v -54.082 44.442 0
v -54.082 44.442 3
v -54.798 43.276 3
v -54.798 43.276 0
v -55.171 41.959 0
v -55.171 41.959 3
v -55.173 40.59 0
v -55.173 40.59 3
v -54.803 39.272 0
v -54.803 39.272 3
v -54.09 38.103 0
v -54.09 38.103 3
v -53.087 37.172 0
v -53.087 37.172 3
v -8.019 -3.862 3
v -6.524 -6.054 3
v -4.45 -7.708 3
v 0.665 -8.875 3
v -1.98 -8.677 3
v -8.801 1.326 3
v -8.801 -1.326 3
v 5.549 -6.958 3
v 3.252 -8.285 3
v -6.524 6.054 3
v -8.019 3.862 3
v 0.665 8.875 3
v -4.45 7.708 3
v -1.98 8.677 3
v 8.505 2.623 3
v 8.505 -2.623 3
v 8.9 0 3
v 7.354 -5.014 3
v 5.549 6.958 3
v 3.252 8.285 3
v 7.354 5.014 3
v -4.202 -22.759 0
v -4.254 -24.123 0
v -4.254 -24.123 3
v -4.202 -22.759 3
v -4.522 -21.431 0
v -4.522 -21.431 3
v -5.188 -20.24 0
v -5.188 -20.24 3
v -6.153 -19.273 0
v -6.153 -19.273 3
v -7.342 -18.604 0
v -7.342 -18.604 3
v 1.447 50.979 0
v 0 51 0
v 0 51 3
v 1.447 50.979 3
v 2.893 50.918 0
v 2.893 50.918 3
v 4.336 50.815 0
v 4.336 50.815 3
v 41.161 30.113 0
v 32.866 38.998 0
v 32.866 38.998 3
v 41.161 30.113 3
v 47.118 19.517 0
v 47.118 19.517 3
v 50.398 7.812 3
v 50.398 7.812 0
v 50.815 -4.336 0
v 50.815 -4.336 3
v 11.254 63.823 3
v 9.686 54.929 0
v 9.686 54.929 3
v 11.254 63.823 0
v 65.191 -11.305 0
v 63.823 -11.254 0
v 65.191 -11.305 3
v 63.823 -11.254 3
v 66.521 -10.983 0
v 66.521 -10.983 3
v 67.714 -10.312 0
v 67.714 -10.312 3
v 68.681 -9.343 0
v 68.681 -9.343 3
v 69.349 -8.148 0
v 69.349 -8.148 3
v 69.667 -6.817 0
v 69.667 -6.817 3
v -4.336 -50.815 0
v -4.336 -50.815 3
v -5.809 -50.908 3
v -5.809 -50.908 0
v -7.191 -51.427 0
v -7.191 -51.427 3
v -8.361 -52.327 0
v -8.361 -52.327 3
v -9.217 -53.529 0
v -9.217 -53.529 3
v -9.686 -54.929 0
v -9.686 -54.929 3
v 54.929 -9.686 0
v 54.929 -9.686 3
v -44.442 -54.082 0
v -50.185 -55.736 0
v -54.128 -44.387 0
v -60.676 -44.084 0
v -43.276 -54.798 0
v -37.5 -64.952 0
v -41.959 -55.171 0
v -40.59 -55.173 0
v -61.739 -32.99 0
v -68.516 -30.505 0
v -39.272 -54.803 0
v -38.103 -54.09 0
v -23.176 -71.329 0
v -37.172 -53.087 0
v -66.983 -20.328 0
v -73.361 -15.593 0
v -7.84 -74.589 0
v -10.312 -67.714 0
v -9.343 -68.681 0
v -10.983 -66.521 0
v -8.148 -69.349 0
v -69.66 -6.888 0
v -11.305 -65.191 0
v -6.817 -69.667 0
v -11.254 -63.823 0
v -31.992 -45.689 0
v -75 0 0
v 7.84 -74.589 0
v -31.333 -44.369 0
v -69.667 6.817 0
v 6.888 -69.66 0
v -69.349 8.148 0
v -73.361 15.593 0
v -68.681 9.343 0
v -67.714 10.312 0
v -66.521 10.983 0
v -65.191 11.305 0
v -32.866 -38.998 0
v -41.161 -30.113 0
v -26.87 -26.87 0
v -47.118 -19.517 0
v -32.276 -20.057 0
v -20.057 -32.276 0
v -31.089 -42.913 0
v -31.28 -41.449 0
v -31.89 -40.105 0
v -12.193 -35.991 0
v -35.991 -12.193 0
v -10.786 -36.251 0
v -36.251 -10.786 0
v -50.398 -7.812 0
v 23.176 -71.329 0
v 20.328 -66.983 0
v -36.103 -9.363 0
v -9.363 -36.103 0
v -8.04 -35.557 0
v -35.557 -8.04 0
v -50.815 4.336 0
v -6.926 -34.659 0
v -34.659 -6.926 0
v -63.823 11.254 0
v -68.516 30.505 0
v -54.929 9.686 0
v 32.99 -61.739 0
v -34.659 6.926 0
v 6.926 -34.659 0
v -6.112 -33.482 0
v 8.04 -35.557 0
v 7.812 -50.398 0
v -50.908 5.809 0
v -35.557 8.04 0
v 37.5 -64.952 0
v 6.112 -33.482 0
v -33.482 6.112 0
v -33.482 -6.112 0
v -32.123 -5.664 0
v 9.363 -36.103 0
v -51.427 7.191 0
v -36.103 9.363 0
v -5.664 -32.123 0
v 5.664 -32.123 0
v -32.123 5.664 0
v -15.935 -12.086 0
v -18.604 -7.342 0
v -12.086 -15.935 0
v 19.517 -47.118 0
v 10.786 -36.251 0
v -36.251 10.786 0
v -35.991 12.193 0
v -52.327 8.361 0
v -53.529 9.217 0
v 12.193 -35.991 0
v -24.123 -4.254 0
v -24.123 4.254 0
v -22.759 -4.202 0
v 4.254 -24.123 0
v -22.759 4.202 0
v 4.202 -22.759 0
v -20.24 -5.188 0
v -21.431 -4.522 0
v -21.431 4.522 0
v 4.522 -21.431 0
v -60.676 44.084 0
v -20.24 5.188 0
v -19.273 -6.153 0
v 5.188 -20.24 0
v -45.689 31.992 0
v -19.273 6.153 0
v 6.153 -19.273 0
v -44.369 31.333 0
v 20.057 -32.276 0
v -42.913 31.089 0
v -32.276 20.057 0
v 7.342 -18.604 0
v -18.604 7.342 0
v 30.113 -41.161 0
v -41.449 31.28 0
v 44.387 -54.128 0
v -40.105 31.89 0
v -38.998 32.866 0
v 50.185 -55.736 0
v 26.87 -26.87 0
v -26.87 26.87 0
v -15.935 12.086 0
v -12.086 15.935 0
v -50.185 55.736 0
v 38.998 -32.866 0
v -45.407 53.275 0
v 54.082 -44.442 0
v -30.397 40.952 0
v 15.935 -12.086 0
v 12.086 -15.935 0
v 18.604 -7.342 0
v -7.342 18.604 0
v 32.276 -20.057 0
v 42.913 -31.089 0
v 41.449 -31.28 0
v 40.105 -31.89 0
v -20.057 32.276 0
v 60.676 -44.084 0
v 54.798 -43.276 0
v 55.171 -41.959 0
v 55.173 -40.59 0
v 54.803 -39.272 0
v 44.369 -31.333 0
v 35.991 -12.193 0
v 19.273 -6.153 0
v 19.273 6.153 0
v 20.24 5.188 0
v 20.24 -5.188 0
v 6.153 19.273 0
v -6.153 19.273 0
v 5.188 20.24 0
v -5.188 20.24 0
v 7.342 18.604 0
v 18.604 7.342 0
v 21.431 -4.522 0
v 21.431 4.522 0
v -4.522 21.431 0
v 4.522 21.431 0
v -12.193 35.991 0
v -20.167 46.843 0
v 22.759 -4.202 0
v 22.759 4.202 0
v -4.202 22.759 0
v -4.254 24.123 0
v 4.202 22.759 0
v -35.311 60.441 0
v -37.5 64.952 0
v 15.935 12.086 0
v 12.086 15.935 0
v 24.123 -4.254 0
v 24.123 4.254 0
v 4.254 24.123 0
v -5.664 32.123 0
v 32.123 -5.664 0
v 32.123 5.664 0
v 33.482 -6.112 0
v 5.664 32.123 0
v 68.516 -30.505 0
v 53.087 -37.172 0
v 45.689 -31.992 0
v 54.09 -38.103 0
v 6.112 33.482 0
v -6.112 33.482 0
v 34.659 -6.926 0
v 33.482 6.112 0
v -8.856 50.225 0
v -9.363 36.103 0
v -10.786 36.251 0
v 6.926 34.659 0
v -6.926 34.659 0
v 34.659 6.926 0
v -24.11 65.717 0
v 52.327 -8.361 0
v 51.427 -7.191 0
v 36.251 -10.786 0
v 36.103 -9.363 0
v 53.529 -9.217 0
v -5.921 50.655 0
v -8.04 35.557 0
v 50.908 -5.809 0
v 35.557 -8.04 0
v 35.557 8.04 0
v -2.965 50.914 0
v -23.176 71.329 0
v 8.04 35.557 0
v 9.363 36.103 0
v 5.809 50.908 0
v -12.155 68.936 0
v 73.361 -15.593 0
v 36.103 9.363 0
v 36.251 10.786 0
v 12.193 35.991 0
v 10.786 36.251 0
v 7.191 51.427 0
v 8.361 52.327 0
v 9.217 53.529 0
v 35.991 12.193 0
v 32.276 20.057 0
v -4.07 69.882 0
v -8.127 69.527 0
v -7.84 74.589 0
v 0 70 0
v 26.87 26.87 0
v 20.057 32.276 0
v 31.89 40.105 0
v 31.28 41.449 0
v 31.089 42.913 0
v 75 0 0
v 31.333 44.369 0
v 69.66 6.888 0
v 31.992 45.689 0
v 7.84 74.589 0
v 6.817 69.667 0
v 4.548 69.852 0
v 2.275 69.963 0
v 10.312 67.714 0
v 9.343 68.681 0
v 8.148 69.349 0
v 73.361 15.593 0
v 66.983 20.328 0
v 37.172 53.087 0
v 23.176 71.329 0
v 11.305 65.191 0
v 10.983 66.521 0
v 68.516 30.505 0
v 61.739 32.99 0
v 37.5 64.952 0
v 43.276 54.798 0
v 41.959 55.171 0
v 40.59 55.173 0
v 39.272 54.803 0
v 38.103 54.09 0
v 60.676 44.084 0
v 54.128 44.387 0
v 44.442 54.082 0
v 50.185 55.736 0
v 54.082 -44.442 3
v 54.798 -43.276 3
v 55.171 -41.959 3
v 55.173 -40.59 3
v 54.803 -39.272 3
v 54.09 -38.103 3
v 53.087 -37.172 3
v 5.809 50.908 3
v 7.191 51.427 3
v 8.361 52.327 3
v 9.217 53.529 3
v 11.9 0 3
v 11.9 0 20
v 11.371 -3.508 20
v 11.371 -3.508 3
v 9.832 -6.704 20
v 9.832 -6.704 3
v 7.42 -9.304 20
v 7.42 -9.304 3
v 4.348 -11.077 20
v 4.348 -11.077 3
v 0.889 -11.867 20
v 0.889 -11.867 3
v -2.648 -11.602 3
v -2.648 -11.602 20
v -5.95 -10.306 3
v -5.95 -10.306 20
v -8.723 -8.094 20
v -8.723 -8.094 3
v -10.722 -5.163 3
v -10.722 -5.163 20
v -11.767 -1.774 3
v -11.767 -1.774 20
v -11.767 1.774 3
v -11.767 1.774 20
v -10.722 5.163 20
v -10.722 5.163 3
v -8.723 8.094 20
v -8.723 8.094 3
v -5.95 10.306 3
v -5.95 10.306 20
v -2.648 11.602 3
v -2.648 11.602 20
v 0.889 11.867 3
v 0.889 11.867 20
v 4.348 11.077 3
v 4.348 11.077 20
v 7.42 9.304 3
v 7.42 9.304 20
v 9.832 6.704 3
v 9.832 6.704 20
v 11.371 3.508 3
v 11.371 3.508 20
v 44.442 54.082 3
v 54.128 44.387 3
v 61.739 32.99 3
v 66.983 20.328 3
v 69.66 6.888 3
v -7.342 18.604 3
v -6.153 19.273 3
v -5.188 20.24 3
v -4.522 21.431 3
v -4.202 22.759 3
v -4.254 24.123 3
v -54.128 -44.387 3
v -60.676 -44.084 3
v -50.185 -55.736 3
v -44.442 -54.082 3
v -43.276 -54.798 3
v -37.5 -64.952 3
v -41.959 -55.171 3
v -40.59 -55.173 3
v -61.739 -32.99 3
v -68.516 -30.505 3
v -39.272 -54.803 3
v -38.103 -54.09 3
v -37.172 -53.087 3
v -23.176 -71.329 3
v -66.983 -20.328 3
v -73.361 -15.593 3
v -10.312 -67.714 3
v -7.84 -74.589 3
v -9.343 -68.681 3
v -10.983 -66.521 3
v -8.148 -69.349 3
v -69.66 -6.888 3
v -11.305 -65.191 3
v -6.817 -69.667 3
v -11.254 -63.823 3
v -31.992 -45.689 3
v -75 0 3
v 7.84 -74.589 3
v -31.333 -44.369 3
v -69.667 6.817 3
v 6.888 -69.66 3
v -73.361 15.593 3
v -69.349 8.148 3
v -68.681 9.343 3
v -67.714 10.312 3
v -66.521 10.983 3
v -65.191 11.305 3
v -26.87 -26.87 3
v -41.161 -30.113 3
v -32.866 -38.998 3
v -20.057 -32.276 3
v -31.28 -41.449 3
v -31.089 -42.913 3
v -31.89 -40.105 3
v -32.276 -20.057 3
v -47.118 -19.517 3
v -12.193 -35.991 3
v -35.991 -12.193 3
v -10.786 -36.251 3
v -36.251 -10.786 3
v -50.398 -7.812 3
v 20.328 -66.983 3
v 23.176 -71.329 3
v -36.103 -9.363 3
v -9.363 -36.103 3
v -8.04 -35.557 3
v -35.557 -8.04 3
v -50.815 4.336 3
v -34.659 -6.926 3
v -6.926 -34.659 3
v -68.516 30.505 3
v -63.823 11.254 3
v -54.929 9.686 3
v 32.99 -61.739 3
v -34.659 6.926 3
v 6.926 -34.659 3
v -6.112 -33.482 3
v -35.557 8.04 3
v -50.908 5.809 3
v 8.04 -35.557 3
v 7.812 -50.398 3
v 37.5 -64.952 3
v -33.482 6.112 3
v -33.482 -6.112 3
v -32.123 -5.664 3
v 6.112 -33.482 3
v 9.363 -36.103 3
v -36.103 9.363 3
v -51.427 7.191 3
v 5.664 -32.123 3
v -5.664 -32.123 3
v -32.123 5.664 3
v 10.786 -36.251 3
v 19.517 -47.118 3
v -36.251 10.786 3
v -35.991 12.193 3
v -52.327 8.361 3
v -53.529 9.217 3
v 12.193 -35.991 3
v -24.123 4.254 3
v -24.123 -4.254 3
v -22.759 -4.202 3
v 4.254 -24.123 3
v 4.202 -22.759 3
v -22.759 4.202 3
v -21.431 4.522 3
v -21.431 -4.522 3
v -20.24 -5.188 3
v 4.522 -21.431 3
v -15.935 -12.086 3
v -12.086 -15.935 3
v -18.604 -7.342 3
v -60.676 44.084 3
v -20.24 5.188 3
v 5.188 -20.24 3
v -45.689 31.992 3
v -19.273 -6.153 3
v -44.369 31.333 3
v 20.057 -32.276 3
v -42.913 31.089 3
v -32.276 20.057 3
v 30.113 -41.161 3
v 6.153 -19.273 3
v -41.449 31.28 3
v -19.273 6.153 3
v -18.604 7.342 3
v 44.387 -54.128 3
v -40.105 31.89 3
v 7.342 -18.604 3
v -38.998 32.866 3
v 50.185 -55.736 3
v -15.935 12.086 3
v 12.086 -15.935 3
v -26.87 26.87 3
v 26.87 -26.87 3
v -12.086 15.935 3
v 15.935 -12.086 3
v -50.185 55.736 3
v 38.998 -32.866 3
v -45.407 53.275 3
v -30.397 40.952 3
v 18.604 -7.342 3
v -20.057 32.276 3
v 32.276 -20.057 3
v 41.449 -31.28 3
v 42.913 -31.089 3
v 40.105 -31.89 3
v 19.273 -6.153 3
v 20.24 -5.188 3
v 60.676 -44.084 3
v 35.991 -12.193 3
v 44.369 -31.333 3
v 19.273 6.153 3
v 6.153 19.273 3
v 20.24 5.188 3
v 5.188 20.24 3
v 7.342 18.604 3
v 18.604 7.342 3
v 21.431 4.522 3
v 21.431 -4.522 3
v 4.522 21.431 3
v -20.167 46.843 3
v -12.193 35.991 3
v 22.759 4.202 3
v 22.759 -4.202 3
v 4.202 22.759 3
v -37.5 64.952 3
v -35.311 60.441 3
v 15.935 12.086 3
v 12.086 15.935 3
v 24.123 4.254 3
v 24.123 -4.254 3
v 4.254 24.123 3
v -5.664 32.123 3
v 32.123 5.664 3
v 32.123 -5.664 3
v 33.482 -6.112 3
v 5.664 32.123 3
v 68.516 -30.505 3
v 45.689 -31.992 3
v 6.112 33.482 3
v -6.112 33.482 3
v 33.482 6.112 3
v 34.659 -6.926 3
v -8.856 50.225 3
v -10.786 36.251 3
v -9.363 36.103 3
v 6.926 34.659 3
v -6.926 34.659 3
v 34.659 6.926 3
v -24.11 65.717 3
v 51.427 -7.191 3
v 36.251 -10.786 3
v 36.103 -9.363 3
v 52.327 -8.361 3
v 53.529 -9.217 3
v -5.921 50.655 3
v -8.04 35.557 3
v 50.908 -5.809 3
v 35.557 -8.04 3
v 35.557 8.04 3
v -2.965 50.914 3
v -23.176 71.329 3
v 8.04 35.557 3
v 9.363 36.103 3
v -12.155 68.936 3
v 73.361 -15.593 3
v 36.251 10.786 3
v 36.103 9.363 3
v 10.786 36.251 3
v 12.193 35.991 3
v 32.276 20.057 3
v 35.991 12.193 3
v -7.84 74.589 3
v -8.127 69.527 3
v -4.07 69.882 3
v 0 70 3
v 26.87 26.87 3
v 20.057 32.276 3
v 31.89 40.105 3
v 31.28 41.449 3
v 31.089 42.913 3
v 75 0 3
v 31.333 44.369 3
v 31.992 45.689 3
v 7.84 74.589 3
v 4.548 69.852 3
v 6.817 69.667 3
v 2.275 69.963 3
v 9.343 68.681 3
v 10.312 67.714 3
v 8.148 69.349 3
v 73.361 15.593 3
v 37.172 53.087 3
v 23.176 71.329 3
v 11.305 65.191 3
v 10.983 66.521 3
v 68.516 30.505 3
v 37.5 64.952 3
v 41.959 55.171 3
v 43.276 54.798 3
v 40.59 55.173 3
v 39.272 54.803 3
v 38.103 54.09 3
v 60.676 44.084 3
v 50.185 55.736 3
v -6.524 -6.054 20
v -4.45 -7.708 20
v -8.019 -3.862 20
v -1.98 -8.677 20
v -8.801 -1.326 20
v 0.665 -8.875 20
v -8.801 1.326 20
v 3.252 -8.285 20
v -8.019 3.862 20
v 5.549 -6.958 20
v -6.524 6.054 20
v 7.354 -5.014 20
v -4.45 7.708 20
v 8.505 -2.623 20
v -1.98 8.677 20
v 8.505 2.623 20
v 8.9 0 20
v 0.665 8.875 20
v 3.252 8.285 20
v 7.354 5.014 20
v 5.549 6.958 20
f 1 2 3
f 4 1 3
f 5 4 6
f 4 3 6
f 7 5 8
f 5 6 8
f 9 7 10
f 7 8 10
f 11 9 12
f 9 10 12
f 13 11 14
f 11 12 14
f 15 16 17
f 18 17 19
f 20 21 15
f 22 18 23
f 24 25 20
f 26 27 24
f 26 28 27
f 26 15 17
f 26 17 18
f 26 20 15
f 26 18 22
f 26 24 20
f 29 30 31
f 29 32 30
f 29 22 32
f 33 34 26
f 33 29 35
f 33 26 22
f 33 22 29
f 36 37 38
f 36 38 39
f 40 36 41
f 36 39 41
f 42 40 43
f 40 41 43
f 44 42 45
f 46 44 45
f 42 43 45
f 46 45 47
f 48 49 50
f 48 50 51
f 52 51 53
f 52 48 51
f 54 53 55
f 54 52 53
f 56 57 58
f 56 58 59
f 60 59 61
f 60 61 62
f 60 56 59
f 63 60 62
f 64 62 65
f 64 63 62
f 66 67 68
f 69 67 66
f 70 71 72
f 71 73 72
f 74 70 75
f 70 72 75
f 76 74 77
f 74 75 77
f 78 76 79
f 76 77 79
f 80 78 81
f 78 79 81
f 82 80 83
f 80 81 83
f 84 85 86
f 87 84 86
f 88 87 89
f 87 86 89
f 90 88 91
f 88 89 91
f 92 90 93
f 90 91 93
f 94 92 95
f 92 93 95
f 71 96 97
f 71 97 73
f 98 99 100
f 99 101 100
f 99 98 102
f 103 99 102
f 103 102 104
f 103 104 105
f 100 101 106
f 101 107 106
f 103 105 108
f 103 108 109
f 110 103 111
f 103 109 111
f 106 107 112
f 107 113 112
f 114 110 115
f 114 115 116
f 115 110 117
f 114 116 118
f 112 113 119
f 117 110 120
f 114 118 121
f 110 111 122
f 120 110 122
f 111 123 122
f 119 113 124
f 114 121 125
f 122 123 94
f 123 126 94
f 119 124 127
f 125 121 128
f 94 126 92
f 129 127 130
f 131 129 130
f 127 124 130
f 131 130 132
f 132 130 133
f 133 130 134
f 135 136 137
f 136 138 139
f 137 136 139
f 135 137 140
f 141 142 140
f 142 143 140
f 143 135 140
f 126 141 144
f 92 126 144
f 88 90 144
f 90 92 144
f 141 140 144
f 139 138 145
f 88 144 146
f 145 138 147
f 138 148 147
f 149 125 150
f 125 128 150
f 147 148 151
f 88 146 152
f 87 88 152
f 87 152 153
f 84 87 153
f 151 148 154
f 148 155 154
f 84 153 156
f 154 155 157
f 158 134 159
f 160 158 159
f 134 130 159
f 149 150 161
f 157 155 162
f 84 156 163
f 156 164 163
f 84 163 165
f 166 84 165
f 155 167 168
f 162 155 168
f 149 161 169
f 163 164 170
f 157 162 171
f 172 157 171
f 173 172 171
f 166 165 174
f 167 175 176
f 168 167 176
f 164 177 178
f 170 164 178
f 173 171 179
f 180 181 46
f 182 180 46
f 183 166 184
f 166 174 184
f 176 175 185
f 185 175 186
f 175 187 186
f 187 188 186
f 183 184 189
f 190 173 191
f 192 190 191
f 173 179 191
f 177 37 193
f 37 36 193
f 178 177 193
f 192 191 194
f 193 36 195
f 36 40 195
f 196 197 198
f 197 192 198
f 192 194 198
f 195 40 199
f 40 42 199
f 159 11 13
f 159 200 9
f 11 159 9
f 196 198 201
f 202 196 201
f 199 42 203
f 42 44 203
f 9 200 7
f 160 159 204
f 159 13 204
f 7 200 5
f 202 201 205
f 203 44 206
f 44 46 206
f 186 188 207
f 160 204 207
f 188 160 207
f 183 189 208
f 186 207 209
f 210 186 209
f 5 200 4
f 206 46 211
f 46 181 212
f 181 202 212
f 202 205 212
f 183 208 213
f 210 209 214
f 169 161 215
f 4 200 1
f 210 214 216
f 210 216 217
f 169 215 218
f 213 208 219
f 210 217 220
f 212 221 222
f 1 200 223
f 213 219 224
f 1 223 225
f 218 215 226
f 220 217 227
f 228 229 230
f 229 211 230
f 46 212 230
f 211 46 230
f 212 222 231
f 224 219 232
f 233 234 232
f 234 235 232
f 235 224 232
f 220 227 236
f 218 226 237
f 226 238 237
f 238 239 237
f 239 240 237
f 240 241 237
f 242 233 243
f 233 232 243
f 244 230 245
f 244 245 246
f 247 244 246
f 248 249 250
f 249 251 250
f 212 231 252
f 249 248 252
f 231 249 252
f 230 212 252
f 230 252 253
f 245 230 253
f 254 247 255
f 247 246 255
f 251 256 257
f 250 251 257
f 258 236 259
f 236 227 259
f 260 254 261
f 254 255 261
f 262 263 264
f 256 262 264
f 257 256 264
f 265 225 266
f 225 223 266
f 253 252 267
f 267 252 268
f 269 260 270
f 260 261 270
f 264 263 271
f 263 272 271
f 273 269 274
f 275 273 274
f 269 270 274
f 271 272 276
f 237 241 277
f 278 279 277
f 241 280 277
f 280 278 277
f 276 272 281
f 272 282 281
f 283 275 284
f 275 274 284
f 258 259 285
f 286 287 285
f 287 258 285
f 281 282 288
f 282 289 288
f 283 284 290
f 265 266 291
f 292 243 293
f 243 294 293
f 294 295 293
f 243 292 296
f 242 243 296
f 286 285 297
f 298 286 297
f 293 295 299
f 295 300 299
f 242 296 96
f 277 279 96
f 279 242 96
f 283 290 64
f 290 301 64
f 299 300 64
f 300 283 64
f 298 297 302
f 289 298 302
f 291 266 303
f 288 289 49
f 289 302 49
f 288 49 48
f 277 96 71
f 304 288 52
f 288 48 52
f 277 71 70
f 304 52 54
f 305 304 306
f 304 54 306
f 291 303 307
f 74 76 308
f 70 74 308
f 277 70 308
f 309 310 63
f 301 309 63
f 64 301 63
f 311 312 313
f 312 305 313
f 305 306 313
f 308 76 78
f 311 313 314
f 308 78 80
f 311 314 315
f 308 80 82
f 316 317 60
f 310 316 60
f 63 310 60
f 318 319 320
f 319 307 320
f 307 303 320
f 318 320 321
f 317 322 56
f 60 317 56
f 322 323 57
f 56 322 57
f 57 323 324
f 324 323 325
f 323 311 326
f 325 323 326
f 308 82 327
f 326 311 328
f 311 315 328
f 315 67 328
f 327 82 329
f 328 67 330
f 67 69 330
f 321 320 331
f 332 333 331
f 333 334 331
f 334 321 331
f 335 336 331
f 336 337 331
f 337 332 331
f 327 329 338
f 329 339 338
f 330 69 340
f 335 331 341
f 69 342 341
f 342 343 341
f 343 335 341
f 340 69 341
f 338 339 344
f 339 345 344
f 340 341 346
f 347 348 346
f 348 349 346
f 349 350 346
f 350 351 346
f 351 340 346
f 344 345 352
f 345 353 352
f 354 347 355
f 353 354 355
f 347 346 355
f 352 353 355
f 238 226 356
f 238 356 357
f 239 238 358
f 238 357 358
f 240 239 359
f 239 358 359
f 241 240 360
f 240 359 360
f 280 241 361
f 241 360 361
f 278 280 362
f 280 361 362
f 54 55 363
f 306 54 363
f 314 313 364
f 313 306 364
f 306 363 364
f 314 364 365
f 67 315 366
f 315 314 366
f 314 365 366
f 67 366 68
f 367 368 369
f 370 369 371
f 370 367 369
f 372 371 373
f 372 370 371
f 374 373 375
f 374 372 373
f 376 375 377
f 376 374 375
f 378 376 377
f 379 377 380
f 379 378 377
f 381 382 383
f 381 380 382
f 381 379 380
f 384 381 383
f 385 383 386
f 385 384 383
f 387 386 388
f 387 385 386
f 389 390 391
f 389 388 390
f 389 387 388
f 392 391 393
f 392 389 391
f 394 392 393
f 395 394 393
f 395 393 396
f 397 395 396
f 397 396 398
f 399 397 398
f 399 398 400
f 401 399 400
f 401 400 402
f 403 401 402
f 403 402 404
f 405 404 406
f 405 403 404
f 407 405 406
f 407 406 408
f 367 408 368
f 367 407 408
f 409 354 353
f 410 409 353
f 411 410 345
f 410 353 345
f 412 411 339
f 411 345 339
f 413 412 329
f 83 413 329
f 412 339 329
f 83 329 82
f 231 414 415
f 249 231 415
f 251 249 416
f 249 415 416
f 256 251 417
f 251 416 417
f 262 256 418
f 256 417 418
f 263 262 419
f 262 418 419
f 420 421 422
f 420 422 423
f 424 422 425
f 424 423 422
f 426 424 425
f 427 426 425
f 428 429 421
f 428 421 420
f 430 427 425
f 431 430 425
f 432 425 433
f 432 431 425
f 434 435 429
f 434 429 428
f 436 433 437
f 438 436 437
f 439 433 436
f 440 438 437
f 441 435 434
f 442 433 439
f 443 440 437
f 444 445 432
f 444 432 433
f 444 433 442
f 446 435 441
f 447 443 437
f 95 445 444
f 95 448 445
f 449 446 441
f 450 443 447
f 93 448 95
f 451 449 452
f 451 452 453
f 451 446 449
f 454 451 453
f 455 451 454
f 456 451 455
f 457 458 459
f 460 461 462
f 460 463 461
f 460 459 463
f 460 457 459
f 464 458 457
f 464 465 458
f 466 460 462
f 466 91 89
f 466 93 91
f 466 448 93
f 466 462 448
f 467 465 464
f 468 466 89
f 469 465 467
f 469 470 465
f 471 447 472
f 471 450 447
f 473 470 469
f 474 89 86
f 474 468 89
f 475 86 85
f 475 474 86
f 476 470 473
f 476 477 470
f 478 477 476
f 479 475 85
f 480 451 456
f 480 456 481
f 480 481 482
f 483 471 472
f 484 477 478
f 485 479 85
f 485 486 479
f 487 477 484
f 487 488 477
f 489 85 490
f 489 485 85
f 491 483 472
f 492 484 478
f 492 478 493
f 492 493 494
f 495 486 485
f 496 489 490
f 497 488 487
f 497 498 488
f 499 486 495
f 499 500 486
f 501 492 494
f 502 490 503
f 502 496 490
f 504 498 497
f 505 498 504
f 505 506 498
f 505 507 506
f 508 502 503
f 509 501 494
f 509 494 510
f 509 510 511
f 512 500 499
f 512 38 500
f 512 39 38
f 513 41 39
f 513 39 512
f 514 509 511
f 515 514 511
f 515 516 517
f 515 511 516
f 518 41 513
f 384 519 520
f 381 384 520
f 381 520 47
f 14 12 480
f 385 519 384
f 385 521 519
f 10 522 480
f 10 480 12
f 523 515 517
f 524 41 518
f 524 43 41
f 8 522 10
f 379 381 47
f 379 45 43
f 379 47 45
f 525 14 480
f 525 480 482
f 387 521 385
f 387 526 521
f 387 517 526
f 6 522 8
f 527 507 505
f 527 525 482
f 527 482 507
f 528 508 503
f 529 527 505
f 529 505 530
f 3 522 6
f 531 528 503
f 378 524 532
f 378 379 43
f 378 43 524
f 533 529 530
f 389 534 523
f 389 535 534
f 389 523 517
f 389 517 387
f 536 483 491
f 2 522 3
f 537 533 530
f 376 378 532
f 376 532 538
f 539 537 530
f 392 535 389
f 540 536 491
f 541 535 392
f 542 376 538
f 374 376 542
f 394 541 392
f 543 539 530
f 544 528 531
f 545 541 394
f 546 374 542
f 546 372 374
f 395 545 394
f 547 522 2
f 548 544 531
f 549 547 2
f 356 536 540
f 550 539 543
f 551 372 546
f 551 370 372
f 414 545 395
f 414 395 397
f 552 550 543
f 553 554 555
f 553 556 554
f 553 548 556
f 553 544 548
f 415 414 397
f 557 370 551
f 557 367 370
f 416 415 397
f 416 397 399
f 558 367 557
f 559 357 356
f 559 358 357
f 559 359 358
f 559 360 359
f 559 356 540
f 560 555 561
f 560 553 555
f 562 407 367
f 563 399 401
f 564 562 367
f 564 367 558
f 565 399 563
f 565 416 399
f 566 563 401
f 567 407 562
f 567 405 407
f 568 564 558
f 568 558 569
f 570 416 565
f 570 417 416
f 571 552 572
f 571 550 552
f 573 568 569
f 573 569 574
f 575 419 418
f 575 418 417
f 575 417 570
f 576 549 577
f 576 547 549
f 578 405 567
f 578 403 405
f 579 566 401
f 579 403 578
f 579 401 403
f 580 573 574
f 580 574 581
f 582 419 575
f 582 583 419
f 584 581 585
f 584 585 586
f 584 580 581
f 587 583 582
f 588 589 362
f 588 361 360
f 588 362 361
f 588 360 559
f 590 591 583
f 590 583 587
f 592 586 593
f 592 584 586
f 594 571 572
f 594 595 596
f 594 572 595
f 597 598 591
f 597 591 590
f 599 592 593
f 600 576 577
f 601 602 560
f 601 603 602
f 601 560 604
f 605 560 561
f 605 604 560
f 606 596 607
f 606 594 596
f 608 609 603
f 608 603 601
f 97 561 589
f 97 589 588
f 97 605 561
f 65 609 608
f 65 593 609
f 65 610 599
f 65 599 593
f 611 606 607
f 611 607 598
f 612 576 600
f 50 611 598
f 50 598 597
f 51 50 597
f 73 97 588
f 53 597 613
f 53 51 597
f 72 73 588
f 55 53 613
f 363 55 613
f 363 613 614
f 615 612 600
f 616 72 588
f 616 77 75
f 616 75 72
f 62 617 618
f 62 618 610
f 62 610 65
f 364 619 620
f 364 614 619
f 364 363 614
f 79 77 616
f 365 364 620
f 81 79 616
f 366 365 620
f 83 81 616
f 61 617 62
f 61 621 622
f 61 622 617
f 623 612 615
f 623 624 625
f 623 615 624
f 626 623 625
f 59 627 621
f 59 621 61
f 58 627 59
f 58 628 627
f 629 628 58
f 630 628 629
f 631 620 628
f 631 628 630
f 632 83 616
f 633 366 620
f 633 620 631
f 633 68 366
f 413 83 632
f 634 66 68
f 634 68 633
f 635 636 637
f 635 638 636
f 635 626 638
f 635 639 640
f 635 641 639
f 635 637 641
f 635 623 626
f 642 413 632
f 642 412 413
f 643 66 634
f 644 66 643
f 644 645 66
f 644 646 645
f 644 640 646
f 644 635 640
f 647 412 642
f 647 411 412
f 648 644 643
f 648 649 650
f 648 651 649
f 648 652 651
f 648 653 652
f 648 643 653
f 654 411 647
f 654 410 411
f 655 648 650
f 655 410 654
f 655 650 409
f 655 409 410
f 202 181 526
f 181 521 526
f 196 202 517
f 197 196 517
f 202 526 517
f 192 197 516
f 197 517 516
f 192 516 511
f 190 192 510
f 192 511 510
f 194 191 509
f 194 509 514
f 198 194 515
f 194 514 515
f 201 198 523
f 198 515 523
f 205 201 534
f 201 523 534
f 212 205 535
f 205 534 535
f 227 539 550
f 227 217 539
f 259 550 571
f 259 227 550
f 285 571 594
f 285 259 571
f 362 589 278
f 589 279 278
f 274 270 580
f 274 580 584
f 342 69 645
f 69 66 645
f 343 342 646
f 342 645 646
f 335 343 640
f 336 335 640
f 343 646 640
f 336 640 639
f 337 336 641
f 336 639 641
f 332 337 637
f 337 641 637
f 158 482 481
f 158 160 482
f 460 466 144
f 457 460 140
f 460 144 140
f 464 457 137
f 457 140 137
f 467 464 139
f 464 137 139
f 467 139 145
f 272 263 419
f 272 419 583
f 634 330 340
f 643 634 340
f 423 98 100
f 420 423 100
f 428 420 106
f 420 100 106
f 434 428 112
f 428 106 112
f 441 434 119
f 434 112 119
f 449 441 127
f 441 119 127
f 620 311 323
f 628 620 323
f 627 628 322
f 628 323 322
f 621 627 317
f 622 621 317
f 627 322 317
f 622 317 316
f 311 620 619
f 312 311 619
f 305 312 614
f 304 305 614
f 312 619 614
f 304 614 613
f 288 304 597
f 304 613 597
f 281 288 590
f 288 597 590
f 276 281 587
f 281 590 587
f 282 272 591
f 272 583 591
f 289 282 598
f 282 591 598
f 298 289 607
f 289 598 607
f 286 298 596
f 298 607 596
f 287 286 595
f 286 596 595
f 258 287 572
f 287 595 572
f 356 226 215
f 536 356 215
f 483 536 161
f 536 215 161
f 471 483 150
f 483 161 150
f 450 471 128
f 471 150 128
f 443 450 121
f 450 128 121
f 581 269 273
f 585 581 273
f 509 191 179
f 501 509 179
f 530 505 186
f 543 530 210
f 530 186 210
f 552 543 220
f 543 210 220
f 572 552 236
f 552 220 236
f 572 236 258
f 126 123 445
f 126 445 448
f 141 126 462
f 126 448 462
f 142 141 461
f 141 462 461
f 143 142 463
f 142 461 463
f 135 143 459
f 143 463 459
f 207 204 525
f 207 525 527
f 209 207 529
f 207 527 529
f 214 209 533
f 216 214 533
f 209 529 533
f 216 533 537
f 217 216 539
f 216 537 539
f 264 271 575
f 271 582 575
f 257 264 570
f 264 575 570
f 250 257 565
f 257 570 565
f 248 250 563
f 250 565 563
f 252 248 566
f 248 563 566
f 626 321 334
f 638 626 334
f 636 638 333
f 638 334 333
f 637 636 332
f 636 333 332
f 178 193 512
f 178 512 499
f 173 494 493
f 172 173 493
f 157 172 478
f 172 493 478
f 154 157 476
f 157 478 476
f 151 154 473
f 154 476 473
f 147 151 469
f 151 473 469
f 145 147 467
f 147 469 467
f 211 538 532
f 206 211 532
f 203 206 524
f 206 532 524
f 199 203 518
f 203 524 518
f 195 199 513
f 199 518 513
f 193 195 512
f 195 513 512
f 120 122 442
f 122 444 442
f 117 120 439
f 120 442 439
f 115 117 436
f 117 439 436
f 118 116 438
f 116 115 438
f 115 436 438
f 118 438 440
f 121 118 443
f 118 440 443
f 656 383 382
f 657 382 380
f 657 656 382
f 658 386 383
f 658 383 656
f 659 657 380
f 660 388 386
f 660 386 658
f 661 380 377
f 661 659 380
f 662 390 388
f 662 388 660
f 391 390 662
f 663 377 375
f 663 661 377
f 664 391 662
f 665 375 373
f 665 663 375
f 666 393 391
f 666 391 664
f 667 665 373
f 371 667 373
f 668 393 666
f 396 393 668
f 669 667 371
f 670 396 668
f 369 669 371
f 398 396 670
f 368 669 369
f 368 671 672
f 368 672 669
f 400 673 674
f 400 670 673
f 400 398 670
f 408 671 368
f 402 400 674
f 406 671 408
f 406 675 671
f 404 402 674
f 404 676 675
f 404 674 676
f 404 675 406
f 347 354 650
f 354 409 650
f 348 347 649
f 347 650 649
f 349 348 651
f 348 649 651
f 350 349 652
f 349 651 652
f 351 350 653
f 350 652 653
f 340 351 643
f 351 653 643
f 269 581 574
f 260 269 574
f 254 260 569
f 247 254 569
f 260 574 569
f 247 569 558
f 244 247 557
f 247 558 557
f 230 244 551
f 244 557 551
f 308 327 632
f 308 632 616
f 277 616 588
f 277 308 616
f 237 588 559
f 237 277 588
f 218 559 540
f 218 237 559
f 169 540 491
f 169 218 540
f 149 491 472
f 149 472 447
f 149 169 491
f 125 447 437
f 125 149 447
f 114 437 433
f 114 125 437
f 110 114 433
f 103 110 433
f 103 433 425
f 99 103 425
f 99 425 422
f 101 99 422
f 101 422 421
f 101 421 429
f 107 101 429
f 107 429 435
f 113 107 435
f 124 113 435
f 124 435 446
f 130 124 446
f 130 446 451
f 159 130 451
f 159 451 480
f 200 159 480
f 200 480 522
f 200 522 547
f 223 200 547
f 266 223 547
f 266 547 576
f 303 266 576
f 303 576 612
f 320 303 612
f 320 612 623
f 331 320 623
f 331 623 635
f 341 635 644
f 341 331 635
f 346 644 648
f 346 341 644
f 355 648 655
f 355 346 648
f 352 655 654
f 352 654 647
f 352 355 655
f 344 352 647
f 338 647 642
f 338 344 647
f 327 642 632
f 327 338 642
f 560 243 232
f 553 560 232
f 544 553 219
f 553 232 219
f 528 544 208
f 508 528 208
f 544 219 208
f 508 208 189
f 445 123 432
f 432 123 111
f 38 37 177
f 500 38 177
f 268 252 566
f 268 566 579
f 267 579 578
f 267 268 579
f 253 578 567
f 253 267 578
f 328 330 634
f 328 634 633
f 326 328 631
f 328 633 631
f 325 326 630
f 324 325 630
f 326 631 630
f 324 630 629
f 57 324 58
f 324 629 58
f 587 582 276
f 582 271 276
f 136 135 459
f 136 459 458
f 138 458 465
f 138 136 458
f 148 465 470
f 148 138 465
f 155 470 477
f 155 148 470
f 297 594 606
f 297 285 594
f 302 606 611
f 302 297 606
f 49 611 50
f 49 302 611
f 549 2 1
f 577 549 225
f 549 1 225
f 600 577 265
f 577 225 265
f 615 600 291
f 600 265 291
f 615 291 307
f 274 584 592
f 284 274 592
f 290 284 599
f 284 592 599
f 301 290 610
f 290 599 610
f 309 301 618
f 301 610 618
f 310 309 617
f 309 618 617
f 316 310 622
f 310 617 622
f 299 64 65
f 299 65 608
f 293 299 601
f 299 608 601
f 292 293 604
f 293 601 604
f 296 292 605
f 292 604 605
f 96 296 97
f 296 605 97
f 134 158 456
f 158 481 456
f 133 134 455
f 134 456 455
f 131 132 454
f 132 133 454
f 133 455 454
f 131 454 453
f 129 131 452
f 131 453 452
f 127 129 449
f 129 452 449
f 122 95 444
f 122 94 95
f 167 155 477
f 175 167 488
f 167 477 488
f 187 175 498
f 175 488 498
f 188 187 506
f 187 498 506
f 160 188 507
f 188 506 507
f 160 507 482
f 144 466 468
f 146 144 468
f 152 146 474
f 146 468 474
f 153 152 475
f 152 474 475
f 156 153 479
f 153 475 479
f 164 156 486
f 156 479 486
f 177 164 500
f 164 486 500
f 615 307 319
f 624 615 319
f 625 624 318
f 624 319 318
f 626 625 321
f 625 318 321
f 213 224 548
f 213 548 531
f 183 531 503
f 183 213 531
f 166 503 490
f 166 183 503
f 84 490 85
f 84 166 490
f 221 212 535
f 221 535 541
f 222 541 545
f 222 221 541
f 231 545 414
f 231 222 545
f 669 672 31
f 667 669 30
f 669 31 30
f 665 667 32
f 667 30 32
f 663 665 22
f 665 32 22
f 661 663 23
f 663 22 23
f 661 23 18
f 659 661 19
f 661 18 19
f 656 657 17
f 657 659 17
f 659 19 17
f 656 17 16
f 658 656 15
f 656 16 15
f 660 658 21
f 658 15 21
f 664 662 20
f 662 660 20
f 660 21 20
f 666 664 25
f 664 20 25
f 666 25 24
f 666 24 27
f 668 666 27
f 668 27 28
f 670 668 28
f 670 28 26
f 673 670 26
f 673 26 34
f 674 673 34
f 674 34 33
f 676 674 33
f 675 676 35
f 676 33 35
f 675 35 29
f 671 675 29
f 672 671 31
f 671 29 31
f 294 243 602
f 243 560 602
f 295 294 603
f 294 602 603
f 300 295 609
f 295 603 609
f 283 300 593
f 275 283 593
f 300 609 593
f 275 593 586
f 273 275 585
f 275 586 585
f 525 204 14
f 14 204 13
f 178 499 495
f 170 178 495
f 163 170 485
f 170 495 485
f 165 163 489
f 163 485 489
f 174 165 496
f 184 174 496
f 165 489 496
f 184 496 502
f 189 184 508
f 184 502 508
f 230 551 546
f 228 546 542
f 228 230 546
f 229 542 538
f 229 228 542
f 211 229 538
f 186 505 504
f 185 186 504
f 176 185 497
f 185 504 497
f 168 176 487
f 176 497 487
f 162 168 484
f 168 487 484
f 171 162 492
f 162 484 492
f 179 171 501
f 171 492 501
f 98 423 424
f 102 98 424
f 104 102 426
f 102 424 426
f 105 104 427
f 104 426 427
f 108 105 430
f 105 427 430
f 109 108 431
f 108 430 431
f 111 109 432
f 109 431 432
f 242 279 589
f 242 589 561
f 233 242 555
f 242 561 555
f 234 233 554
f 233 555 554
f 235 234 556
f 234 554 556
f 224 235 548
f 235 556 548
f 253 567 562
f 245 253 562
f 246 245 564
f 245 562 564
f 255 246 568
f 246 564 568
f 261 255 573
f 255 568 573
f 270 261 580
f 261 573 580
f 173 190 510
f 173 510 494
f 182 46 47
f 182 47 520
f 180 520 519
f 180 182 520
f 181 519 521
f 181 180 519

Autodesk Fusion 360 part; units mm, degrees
sketch "Sketch1" plane through (0, 0, 0) normal (0, 0, 1) x (1, 0, 0)
  circle A0 centre (0, 0) radius 75
  circle A1 centre (0, 0) radius 46
  circle A2 centre (0, 0) radius 43
  circle A3 centre (0, 0) radius 11.9
  circle A4 centre (0, 0) radius 8.9
  line L0 (0, 90) -> (0, -90)
  line L1 (12.1554, 68.9365) -> (13.0236, 73.8606)
  line L2 (8.8561, 50.2252) -> (12.1554, 68.9365)
  line L3 (-12.1554, 68.9365) -> (-13.0236, 73.8606)
  line L4 (-8.8561, 50.2252) -> (-12.1554, 68.9365)
  arc A5 (-8.8561, 50.2252) -> (8.8561, 50.2252) centre (0, 0) ccw
  arc A6 (0, 51) -> (-8.8561, 50.2252) centre (0, 0) ccw
  arc A7 (8.8561, 50.2252) -> (0, 51) centre (0, 0) ccw
  arc A8 (-12.1554, 68.9365) -> (12.1554, 68.9365) centre (0, 0) ccw
  arc A9 (12.1554, 68.9365) -> (0, 70) centre (0, 0) ccw
  arc A10 (0, 70) -> (-12.1554, 68.9365) centre (0, 0) ccw
  arc A11 (-6.5986, 37.4227) -> (6.5986, 37.4227) centre (0, 0) ccw
  arc A12 (6.5986, 37.4227) -> (0, 38) centre (0, 0) ccw
  arc A13 (0, 38) -> (-6.5986, 37.4227) centre (0, 0) ccw
  line L5 (0, 0) -> (3.473, 19.6962)
  line L6 (6.5986, 37.4227) -> (8.8561, 50.2252)
  line L7 (3.473, 19.6962) -> (6.5986, 37.4227)
  line L8 (0, 0) -> (-3.473, 19.6962)
  line L9 (-6.5986, 37.4227) -> (-8.8561, 50.2252)
  line L10 (-3.473, 19.6962) -> (-6.5986, 37.4227)
  arc A14 (-3.473, 19.6962) -> (3.473, 19.6962) centre (0, 0) ccw
  arc A15 (0, 20) -> (-3.473, 19.6962) centre (0, 0) ccw
  arc A16 (3.473, 19.6962) -> (0, 20) centre (0, 0) ccw
  arc A17 (-40.1504, 57.3406) -> (-49.4975, 49.4975) centre (0, 0) ccw
  arc A18 (-49.4975, 49.4975) -> (-57.3406, 40.1504) centre (0, 0) ccw
  line L11 (-29.2524, 41.7768) -> (-40.1504, 57.3406)
  arc A19 (-29.2524, 41.7768) -> (-36.0624, 36.0624) centre (0, 0) ccw
  arc A20 (-36.0624, 36.0624) -> (-41.7768, 29.2524) centre (0, 0) ccw
  line L12 (-41.7768, 29.2524) -> (-57.3406, 40.1504)
  arc A21 (-21.7959, 31.1278) -> (-26.8701, 26.8701) centre (0, 0) ccw
  line L13 (-11.4715, 16.383) -> (-21.7959, 31.1278)
  arc A22 (-11.4715, 16.383) -> (-14.1421, 14.1421) centre (0, 0) ccw
  arc A23 (-14.1421, 14.1421) -> (-16.383, 11.4715) centre (0, 0) ccw
  line L14 (-16.383, 11.4715) -> (-31.1278, 21.7959)
  arc A24 (-26.8701, 26.8701) -> (-31.1278, 21.7959) centre (0, 0) ccw
  arc A25 (-68.9365, 12.1554) -> (-70, 0) centre (0, 0) ccw
  arc A26 (-70, 0) -> (-68.9365, -12.1554) centre (0, 0) ccw
  line L15 (-50.2252, 8.8561) -> (-68.9365, 12.1554)
  arc A27 (-50.2252, 8.8561) -> (-51, 0) centre (0, 0) ccw
  arc A28 (-51, 0) -> (-50.2252, -8.8561) centre (0, 0) ccw
  line L16 (-50.2252, -8.8561) -> (-68.9365, -12.1554)
  arc A29 (-37.4227, 6.5986) -> (-38, 0) centre (0, 0) ccw
  line L17 (-19.6962, 3.473) -> (-37.4227, 6.5986)
  arc A30 (-19.6962, 3.473) -> (-20, 0) centre (0, 0) ccw
  arc A31 (-20, 0) -> (-19.6962, -3.473) centre (0, 0) ccw
  line L18 (-19.6962, -3.473) -> (-37.4227, -6.5986)
  arc A32 (-38, 0) -> (-37.4227, -6.5986) centre (0, 0) ccw
  arc A33 (-57.3406, -40.1504) -> (-49.4975, -49.4975) centre (0, 0) ccw
  arc A34 (-49.4975, -49.4975) -> (-40.1504, -57.3406) centre (0, 0) ccw
  line L19 (-41.7768, -29.2524) -> (-57.3406, -40.1504)
  arc A35 (-41.7768, -29.2524) -> (-36.0624, -36.0624) centre (0, 0) ccw
  arc A36 (-36.0624, -36.0624) -> (-29.2524, -41.7768) centre (0, 0) ccw
  line L20 (-29.2524, -41.7768) -> (-40.1504, -57.3406)
  arc A37 (-31.1278, -21.7959) -> (-26.8701, -26.8701) centre (0, 0) ccw
  line L21 (-16.383, -11.4715) -> (-31.1278, -21.7959)
  arc A38 (-16.383, -11.4715) -> (-14.1421, -14.1421) centre (0, 0) ccw
  arc A39 (-14.1421, -14.1421) -> (-11.4715, -16.383) centre (0, 0) ccw
  line L22 (-11.4715, -16.383) -> (-21.7959, -31.1278)
  arc A40 (-26.8701, -26.8701) -> (-21.7959, -31.1278) centre (0, 0) ccw
  arc A41 (-12.1554, -68.9365) -> (0, -70) centre (0, 0) ccw
  arc A42 (0, -70) -> (12.1554, -68.9365) centre (0, 0) ccw
  line L23 (-8.8561, -50.2252) -> (-12.1554, -68.9365)
  arc A43 (-8.8561, -50.2252) -> (0, -51) centre (0, 0) ccw
  arc A44 (0, -51) -> (8.8561, -50.2252) centre (0, 0) ccw
  line L24 (8.8561, -50.2252) -> (12.1554, -68.9365)
  arc A45 (-6.5986, -37.4227) -> (0, -38) centre (0, 0) ccw
  line L25 (-3.473, -19.6962) -> (-6.5986, -37.4227)
  arc A46 (-3.473, -19.6962) -> (0, -20) centre (0, 0) ccw
  arc A47 (0, -20) -> (3.473, -19.6962) centre (0, 0) ccw
  line L26 (3.473, -19.6962) -> (6.5986, -37.4227)
  arc A48 (0, -38) -> (6.5986, -37.4227) centre (0, 0) ccw
  arc A49 (40.1504, -57.3406) -> (49.4975, -49.4975) centre (0, 0) ccw
  arc A50 (49.4975, -49.4975) -> (57.3406, -40.1504) centre (0, 0) ccw
  line L27 (29.2524, -41.7768) -> (40.1504, -57.3406)
  arc A51 (29.2524, -41.7768) -> (36.0624, -36.0624) centre (0, 0) ccw
  arc A52 (36.0624, -36.0624) -> (41.7768, -29.2524) centre (0, 0) ccw
  line L28 (41.7768, -29.2524) -> (57.3406, -40.1504)
  arc A53 (21.7959, -31.1278) -> (26.8701, -26.8701) centre (0, 0) ccw
  line L29 (11.4715, -16.383) -> (21.7959, -31.1278)
  arc A54 (11.4715, -16.383) -> (14.1421, -14.1421) centre (0, 0) ccw
  arc A55 (14.1421, -14.1421) -> (16.383, -11.4715) centre (0, 0) ccw
  line L30 (16.383, -11.4715) -> (31.1278, -21.7959)
  arc A56 (26.8701, -26.8701) -> (31.1278, -21.7959) centre (0, 0) ccw
  arc A57 (68.9365, -12.1554) -> (70, 0) centre (0, 0) ccw
  arc A58 (70, 0) -> (68.9365, 12.1554) centre (0, 0) ccw
  line L31 (50.2252, -8.8561) -> (68.9365, -12.1554)
  arc A59 (50.2252, -8.8561) -> (51, 0) centre (0, 0) ccw
  arc A60 (51, 0) -> (50.2252, 8.8561) centre (0, 0) ccw
  line L32 (50.2252, 8.8561) -> (68.9365, 12.1554)
  arc A61 (37.4227, -6.5986) -> (38, 0) centre (0, 0) ccw
  line L33 (19.6962, -3.473) -> (37.4227, -6.5986)
  arc A62 (19.6962, -3.473) -> (20, 0) centre (0, 0) ccw
  arc A63 (20, 0) -> (19.6962, 3.473) centre (0, 0) ccw
  line L34 (19.6962, 3.473) -> (37.4227, 6.5986)
  arc A64 (38, 0) -> (37.4227, 6.5986) centre (0, 0) ccw
  arc A65 (57.3406, 40.1504) -> (49.4975, 49.4975) centre (0, 0) ccw
  arc A66 (49.4975, 49.4975) -> (40.1504, 57.3406) centre (0, 0) ccw
  line L35 (41.7768, 29.2524) -> (57.3406, 40.1504)
  arc A67 (41.7768, 29.2524) -> (36.0624, 36.0624) centre (0, 0) ccw
  arc A68 (36.0624, 36.0624) -> (29.2524, 41.7768) centre (0, 0) ccw
  line L36 (29.2524, 41.7768) -> (40.1504, 57.3406)
  arc A69 (31.1278, 21.7959) -> (26.8701, 26.8701) centre (0, 0) ccw
  line L37 (16.383, 11.4715) -> (31.1278, 21.7959)
  arc A70 (16.383, 11.4715) -> (14.1421, 14.1421) centre (0, 0) ccw
  arc A71 (14.1421, 14.1421) -> (11.4715, 16.383) centre (0, 0) ccw
  line L38 (11.4715, 16.383) -> (21.7959, 31.1278)
  arc A72 (26.8701, 26.8701) -> (21.7959, 31.1278) centre (0, 0) ccw
  dimension "d1" = 150
  dimension "d2" = -29
  dimension "d3" = -3
  dimension "d12" = 23.8
  dimension "d13" = -3
  dimension "d20" = 10
  dimension "d21" = 20
  dimension "d23" = 360
extrude "Extrude1" add sketch "Sketch1" along normal blind 3
extrude "Extrude3" add sketch "Sketch1" along normal blind 20 contours A3 A4 L0 L5 | A3 A4 L0 L5 | A3 A4 L0 L8 | A3 A4 L0 L8
extrude "Extrude4" cut sketch "Sketch1" along normal up to surface (3 mm away) contours L0 L2 A7 A9 | L0 A5 A8 A41 L23 A43 | L0 A5 A8 A42 A44 L24 | L0 L4 A6 A10 | A5 A8 A65 A66 L35 A67 A68 L36 | L4 A5 A8 L11 | A5 A8 L24 L27 | A5 A8 A17 A18 L11 A19 A20 L12 | A5 A8 A33 A34 L19 A35 A36 L20 | A5 A8 A49 A50 L27 A51 A52 L28 | A5 A8 L32 L35 | A5 A8 A57 A58 L31 A59 A60 L32 | A5 A8 L16 L19 | A5 A8 A25 A26 L15 A27 A28 L16
fillet "Fillet5" radius 5 16 edges at (-68.9365, 12.1554, 1.5) (-50.2252, 8.8561, 1.5) (-40.1504, -57.3406, 1.5) (-29.2524, -41.7768, 1.5) (-12.1554, -68.9365, 1.5) (-8.8561, -50.2252, 1.5) (57.3406, -40.1504, 1.5) (41.7768, -29.2524, 1.5) (68.9365, -12.1554, 1.5) (50.2252, -8.8561, 1.5) (40.1504, 57.3406, 1.5) (29.2524, 41.7768, 1.5) (8.8561, 50.2252, 1.5) (12.1554, 68.9365, 1.5) (-57.3406, 40.1504, 1.5) (-41.7768, 29.2524, 1.5)
extrude "Extrude5" cut sketch "Sketch1" along normal up to surface (3 mm away) contours A11 L7 A14 L38 | A11 A14 A69 L37 A70 A71 L38 A72 | A11 L10 A14 L13 | A11 A14 L22 L25 | A11 A14 L26 L29 | A11 A14 A21 L13 A22 A23 L14 A24 | A11 A14 A37 L21 A38 A39 L22 A40 | A11 A14 A53 L29 A54 A55 L30 A56 | A11 A14 L34 L37 | A11 A14 L14 L17 | A11 A14 L18 L21 | A11 A14 L30 L33
fillet "Fillet6" radius 5 16 edges at (-6.5986, 37.4227, 1.5) (-3.473, 19.6962, 1.5) (-37.4227, 6.5986, 1.5) (-19.6962, 3.473, 1.5) (-37.4227, -6.5986, 1.5) (-19.6962, -3.473, 1.5) (-6.5986, -37.4227, 1.5) (-3.473, -19.6962, 1.5) (6.5986, -37.4227, 1.5) (3.473, -19.6962, 1.5) (19.6962, -3.473, 1.5) (37.4227, -6.5986, 1.5) (37.4227, 6.5986, 1.5) (19.6962, 3.473, 1.5) (6.5986, 37.4227, 1.5) (3.473, 19.6962, 1.5)
